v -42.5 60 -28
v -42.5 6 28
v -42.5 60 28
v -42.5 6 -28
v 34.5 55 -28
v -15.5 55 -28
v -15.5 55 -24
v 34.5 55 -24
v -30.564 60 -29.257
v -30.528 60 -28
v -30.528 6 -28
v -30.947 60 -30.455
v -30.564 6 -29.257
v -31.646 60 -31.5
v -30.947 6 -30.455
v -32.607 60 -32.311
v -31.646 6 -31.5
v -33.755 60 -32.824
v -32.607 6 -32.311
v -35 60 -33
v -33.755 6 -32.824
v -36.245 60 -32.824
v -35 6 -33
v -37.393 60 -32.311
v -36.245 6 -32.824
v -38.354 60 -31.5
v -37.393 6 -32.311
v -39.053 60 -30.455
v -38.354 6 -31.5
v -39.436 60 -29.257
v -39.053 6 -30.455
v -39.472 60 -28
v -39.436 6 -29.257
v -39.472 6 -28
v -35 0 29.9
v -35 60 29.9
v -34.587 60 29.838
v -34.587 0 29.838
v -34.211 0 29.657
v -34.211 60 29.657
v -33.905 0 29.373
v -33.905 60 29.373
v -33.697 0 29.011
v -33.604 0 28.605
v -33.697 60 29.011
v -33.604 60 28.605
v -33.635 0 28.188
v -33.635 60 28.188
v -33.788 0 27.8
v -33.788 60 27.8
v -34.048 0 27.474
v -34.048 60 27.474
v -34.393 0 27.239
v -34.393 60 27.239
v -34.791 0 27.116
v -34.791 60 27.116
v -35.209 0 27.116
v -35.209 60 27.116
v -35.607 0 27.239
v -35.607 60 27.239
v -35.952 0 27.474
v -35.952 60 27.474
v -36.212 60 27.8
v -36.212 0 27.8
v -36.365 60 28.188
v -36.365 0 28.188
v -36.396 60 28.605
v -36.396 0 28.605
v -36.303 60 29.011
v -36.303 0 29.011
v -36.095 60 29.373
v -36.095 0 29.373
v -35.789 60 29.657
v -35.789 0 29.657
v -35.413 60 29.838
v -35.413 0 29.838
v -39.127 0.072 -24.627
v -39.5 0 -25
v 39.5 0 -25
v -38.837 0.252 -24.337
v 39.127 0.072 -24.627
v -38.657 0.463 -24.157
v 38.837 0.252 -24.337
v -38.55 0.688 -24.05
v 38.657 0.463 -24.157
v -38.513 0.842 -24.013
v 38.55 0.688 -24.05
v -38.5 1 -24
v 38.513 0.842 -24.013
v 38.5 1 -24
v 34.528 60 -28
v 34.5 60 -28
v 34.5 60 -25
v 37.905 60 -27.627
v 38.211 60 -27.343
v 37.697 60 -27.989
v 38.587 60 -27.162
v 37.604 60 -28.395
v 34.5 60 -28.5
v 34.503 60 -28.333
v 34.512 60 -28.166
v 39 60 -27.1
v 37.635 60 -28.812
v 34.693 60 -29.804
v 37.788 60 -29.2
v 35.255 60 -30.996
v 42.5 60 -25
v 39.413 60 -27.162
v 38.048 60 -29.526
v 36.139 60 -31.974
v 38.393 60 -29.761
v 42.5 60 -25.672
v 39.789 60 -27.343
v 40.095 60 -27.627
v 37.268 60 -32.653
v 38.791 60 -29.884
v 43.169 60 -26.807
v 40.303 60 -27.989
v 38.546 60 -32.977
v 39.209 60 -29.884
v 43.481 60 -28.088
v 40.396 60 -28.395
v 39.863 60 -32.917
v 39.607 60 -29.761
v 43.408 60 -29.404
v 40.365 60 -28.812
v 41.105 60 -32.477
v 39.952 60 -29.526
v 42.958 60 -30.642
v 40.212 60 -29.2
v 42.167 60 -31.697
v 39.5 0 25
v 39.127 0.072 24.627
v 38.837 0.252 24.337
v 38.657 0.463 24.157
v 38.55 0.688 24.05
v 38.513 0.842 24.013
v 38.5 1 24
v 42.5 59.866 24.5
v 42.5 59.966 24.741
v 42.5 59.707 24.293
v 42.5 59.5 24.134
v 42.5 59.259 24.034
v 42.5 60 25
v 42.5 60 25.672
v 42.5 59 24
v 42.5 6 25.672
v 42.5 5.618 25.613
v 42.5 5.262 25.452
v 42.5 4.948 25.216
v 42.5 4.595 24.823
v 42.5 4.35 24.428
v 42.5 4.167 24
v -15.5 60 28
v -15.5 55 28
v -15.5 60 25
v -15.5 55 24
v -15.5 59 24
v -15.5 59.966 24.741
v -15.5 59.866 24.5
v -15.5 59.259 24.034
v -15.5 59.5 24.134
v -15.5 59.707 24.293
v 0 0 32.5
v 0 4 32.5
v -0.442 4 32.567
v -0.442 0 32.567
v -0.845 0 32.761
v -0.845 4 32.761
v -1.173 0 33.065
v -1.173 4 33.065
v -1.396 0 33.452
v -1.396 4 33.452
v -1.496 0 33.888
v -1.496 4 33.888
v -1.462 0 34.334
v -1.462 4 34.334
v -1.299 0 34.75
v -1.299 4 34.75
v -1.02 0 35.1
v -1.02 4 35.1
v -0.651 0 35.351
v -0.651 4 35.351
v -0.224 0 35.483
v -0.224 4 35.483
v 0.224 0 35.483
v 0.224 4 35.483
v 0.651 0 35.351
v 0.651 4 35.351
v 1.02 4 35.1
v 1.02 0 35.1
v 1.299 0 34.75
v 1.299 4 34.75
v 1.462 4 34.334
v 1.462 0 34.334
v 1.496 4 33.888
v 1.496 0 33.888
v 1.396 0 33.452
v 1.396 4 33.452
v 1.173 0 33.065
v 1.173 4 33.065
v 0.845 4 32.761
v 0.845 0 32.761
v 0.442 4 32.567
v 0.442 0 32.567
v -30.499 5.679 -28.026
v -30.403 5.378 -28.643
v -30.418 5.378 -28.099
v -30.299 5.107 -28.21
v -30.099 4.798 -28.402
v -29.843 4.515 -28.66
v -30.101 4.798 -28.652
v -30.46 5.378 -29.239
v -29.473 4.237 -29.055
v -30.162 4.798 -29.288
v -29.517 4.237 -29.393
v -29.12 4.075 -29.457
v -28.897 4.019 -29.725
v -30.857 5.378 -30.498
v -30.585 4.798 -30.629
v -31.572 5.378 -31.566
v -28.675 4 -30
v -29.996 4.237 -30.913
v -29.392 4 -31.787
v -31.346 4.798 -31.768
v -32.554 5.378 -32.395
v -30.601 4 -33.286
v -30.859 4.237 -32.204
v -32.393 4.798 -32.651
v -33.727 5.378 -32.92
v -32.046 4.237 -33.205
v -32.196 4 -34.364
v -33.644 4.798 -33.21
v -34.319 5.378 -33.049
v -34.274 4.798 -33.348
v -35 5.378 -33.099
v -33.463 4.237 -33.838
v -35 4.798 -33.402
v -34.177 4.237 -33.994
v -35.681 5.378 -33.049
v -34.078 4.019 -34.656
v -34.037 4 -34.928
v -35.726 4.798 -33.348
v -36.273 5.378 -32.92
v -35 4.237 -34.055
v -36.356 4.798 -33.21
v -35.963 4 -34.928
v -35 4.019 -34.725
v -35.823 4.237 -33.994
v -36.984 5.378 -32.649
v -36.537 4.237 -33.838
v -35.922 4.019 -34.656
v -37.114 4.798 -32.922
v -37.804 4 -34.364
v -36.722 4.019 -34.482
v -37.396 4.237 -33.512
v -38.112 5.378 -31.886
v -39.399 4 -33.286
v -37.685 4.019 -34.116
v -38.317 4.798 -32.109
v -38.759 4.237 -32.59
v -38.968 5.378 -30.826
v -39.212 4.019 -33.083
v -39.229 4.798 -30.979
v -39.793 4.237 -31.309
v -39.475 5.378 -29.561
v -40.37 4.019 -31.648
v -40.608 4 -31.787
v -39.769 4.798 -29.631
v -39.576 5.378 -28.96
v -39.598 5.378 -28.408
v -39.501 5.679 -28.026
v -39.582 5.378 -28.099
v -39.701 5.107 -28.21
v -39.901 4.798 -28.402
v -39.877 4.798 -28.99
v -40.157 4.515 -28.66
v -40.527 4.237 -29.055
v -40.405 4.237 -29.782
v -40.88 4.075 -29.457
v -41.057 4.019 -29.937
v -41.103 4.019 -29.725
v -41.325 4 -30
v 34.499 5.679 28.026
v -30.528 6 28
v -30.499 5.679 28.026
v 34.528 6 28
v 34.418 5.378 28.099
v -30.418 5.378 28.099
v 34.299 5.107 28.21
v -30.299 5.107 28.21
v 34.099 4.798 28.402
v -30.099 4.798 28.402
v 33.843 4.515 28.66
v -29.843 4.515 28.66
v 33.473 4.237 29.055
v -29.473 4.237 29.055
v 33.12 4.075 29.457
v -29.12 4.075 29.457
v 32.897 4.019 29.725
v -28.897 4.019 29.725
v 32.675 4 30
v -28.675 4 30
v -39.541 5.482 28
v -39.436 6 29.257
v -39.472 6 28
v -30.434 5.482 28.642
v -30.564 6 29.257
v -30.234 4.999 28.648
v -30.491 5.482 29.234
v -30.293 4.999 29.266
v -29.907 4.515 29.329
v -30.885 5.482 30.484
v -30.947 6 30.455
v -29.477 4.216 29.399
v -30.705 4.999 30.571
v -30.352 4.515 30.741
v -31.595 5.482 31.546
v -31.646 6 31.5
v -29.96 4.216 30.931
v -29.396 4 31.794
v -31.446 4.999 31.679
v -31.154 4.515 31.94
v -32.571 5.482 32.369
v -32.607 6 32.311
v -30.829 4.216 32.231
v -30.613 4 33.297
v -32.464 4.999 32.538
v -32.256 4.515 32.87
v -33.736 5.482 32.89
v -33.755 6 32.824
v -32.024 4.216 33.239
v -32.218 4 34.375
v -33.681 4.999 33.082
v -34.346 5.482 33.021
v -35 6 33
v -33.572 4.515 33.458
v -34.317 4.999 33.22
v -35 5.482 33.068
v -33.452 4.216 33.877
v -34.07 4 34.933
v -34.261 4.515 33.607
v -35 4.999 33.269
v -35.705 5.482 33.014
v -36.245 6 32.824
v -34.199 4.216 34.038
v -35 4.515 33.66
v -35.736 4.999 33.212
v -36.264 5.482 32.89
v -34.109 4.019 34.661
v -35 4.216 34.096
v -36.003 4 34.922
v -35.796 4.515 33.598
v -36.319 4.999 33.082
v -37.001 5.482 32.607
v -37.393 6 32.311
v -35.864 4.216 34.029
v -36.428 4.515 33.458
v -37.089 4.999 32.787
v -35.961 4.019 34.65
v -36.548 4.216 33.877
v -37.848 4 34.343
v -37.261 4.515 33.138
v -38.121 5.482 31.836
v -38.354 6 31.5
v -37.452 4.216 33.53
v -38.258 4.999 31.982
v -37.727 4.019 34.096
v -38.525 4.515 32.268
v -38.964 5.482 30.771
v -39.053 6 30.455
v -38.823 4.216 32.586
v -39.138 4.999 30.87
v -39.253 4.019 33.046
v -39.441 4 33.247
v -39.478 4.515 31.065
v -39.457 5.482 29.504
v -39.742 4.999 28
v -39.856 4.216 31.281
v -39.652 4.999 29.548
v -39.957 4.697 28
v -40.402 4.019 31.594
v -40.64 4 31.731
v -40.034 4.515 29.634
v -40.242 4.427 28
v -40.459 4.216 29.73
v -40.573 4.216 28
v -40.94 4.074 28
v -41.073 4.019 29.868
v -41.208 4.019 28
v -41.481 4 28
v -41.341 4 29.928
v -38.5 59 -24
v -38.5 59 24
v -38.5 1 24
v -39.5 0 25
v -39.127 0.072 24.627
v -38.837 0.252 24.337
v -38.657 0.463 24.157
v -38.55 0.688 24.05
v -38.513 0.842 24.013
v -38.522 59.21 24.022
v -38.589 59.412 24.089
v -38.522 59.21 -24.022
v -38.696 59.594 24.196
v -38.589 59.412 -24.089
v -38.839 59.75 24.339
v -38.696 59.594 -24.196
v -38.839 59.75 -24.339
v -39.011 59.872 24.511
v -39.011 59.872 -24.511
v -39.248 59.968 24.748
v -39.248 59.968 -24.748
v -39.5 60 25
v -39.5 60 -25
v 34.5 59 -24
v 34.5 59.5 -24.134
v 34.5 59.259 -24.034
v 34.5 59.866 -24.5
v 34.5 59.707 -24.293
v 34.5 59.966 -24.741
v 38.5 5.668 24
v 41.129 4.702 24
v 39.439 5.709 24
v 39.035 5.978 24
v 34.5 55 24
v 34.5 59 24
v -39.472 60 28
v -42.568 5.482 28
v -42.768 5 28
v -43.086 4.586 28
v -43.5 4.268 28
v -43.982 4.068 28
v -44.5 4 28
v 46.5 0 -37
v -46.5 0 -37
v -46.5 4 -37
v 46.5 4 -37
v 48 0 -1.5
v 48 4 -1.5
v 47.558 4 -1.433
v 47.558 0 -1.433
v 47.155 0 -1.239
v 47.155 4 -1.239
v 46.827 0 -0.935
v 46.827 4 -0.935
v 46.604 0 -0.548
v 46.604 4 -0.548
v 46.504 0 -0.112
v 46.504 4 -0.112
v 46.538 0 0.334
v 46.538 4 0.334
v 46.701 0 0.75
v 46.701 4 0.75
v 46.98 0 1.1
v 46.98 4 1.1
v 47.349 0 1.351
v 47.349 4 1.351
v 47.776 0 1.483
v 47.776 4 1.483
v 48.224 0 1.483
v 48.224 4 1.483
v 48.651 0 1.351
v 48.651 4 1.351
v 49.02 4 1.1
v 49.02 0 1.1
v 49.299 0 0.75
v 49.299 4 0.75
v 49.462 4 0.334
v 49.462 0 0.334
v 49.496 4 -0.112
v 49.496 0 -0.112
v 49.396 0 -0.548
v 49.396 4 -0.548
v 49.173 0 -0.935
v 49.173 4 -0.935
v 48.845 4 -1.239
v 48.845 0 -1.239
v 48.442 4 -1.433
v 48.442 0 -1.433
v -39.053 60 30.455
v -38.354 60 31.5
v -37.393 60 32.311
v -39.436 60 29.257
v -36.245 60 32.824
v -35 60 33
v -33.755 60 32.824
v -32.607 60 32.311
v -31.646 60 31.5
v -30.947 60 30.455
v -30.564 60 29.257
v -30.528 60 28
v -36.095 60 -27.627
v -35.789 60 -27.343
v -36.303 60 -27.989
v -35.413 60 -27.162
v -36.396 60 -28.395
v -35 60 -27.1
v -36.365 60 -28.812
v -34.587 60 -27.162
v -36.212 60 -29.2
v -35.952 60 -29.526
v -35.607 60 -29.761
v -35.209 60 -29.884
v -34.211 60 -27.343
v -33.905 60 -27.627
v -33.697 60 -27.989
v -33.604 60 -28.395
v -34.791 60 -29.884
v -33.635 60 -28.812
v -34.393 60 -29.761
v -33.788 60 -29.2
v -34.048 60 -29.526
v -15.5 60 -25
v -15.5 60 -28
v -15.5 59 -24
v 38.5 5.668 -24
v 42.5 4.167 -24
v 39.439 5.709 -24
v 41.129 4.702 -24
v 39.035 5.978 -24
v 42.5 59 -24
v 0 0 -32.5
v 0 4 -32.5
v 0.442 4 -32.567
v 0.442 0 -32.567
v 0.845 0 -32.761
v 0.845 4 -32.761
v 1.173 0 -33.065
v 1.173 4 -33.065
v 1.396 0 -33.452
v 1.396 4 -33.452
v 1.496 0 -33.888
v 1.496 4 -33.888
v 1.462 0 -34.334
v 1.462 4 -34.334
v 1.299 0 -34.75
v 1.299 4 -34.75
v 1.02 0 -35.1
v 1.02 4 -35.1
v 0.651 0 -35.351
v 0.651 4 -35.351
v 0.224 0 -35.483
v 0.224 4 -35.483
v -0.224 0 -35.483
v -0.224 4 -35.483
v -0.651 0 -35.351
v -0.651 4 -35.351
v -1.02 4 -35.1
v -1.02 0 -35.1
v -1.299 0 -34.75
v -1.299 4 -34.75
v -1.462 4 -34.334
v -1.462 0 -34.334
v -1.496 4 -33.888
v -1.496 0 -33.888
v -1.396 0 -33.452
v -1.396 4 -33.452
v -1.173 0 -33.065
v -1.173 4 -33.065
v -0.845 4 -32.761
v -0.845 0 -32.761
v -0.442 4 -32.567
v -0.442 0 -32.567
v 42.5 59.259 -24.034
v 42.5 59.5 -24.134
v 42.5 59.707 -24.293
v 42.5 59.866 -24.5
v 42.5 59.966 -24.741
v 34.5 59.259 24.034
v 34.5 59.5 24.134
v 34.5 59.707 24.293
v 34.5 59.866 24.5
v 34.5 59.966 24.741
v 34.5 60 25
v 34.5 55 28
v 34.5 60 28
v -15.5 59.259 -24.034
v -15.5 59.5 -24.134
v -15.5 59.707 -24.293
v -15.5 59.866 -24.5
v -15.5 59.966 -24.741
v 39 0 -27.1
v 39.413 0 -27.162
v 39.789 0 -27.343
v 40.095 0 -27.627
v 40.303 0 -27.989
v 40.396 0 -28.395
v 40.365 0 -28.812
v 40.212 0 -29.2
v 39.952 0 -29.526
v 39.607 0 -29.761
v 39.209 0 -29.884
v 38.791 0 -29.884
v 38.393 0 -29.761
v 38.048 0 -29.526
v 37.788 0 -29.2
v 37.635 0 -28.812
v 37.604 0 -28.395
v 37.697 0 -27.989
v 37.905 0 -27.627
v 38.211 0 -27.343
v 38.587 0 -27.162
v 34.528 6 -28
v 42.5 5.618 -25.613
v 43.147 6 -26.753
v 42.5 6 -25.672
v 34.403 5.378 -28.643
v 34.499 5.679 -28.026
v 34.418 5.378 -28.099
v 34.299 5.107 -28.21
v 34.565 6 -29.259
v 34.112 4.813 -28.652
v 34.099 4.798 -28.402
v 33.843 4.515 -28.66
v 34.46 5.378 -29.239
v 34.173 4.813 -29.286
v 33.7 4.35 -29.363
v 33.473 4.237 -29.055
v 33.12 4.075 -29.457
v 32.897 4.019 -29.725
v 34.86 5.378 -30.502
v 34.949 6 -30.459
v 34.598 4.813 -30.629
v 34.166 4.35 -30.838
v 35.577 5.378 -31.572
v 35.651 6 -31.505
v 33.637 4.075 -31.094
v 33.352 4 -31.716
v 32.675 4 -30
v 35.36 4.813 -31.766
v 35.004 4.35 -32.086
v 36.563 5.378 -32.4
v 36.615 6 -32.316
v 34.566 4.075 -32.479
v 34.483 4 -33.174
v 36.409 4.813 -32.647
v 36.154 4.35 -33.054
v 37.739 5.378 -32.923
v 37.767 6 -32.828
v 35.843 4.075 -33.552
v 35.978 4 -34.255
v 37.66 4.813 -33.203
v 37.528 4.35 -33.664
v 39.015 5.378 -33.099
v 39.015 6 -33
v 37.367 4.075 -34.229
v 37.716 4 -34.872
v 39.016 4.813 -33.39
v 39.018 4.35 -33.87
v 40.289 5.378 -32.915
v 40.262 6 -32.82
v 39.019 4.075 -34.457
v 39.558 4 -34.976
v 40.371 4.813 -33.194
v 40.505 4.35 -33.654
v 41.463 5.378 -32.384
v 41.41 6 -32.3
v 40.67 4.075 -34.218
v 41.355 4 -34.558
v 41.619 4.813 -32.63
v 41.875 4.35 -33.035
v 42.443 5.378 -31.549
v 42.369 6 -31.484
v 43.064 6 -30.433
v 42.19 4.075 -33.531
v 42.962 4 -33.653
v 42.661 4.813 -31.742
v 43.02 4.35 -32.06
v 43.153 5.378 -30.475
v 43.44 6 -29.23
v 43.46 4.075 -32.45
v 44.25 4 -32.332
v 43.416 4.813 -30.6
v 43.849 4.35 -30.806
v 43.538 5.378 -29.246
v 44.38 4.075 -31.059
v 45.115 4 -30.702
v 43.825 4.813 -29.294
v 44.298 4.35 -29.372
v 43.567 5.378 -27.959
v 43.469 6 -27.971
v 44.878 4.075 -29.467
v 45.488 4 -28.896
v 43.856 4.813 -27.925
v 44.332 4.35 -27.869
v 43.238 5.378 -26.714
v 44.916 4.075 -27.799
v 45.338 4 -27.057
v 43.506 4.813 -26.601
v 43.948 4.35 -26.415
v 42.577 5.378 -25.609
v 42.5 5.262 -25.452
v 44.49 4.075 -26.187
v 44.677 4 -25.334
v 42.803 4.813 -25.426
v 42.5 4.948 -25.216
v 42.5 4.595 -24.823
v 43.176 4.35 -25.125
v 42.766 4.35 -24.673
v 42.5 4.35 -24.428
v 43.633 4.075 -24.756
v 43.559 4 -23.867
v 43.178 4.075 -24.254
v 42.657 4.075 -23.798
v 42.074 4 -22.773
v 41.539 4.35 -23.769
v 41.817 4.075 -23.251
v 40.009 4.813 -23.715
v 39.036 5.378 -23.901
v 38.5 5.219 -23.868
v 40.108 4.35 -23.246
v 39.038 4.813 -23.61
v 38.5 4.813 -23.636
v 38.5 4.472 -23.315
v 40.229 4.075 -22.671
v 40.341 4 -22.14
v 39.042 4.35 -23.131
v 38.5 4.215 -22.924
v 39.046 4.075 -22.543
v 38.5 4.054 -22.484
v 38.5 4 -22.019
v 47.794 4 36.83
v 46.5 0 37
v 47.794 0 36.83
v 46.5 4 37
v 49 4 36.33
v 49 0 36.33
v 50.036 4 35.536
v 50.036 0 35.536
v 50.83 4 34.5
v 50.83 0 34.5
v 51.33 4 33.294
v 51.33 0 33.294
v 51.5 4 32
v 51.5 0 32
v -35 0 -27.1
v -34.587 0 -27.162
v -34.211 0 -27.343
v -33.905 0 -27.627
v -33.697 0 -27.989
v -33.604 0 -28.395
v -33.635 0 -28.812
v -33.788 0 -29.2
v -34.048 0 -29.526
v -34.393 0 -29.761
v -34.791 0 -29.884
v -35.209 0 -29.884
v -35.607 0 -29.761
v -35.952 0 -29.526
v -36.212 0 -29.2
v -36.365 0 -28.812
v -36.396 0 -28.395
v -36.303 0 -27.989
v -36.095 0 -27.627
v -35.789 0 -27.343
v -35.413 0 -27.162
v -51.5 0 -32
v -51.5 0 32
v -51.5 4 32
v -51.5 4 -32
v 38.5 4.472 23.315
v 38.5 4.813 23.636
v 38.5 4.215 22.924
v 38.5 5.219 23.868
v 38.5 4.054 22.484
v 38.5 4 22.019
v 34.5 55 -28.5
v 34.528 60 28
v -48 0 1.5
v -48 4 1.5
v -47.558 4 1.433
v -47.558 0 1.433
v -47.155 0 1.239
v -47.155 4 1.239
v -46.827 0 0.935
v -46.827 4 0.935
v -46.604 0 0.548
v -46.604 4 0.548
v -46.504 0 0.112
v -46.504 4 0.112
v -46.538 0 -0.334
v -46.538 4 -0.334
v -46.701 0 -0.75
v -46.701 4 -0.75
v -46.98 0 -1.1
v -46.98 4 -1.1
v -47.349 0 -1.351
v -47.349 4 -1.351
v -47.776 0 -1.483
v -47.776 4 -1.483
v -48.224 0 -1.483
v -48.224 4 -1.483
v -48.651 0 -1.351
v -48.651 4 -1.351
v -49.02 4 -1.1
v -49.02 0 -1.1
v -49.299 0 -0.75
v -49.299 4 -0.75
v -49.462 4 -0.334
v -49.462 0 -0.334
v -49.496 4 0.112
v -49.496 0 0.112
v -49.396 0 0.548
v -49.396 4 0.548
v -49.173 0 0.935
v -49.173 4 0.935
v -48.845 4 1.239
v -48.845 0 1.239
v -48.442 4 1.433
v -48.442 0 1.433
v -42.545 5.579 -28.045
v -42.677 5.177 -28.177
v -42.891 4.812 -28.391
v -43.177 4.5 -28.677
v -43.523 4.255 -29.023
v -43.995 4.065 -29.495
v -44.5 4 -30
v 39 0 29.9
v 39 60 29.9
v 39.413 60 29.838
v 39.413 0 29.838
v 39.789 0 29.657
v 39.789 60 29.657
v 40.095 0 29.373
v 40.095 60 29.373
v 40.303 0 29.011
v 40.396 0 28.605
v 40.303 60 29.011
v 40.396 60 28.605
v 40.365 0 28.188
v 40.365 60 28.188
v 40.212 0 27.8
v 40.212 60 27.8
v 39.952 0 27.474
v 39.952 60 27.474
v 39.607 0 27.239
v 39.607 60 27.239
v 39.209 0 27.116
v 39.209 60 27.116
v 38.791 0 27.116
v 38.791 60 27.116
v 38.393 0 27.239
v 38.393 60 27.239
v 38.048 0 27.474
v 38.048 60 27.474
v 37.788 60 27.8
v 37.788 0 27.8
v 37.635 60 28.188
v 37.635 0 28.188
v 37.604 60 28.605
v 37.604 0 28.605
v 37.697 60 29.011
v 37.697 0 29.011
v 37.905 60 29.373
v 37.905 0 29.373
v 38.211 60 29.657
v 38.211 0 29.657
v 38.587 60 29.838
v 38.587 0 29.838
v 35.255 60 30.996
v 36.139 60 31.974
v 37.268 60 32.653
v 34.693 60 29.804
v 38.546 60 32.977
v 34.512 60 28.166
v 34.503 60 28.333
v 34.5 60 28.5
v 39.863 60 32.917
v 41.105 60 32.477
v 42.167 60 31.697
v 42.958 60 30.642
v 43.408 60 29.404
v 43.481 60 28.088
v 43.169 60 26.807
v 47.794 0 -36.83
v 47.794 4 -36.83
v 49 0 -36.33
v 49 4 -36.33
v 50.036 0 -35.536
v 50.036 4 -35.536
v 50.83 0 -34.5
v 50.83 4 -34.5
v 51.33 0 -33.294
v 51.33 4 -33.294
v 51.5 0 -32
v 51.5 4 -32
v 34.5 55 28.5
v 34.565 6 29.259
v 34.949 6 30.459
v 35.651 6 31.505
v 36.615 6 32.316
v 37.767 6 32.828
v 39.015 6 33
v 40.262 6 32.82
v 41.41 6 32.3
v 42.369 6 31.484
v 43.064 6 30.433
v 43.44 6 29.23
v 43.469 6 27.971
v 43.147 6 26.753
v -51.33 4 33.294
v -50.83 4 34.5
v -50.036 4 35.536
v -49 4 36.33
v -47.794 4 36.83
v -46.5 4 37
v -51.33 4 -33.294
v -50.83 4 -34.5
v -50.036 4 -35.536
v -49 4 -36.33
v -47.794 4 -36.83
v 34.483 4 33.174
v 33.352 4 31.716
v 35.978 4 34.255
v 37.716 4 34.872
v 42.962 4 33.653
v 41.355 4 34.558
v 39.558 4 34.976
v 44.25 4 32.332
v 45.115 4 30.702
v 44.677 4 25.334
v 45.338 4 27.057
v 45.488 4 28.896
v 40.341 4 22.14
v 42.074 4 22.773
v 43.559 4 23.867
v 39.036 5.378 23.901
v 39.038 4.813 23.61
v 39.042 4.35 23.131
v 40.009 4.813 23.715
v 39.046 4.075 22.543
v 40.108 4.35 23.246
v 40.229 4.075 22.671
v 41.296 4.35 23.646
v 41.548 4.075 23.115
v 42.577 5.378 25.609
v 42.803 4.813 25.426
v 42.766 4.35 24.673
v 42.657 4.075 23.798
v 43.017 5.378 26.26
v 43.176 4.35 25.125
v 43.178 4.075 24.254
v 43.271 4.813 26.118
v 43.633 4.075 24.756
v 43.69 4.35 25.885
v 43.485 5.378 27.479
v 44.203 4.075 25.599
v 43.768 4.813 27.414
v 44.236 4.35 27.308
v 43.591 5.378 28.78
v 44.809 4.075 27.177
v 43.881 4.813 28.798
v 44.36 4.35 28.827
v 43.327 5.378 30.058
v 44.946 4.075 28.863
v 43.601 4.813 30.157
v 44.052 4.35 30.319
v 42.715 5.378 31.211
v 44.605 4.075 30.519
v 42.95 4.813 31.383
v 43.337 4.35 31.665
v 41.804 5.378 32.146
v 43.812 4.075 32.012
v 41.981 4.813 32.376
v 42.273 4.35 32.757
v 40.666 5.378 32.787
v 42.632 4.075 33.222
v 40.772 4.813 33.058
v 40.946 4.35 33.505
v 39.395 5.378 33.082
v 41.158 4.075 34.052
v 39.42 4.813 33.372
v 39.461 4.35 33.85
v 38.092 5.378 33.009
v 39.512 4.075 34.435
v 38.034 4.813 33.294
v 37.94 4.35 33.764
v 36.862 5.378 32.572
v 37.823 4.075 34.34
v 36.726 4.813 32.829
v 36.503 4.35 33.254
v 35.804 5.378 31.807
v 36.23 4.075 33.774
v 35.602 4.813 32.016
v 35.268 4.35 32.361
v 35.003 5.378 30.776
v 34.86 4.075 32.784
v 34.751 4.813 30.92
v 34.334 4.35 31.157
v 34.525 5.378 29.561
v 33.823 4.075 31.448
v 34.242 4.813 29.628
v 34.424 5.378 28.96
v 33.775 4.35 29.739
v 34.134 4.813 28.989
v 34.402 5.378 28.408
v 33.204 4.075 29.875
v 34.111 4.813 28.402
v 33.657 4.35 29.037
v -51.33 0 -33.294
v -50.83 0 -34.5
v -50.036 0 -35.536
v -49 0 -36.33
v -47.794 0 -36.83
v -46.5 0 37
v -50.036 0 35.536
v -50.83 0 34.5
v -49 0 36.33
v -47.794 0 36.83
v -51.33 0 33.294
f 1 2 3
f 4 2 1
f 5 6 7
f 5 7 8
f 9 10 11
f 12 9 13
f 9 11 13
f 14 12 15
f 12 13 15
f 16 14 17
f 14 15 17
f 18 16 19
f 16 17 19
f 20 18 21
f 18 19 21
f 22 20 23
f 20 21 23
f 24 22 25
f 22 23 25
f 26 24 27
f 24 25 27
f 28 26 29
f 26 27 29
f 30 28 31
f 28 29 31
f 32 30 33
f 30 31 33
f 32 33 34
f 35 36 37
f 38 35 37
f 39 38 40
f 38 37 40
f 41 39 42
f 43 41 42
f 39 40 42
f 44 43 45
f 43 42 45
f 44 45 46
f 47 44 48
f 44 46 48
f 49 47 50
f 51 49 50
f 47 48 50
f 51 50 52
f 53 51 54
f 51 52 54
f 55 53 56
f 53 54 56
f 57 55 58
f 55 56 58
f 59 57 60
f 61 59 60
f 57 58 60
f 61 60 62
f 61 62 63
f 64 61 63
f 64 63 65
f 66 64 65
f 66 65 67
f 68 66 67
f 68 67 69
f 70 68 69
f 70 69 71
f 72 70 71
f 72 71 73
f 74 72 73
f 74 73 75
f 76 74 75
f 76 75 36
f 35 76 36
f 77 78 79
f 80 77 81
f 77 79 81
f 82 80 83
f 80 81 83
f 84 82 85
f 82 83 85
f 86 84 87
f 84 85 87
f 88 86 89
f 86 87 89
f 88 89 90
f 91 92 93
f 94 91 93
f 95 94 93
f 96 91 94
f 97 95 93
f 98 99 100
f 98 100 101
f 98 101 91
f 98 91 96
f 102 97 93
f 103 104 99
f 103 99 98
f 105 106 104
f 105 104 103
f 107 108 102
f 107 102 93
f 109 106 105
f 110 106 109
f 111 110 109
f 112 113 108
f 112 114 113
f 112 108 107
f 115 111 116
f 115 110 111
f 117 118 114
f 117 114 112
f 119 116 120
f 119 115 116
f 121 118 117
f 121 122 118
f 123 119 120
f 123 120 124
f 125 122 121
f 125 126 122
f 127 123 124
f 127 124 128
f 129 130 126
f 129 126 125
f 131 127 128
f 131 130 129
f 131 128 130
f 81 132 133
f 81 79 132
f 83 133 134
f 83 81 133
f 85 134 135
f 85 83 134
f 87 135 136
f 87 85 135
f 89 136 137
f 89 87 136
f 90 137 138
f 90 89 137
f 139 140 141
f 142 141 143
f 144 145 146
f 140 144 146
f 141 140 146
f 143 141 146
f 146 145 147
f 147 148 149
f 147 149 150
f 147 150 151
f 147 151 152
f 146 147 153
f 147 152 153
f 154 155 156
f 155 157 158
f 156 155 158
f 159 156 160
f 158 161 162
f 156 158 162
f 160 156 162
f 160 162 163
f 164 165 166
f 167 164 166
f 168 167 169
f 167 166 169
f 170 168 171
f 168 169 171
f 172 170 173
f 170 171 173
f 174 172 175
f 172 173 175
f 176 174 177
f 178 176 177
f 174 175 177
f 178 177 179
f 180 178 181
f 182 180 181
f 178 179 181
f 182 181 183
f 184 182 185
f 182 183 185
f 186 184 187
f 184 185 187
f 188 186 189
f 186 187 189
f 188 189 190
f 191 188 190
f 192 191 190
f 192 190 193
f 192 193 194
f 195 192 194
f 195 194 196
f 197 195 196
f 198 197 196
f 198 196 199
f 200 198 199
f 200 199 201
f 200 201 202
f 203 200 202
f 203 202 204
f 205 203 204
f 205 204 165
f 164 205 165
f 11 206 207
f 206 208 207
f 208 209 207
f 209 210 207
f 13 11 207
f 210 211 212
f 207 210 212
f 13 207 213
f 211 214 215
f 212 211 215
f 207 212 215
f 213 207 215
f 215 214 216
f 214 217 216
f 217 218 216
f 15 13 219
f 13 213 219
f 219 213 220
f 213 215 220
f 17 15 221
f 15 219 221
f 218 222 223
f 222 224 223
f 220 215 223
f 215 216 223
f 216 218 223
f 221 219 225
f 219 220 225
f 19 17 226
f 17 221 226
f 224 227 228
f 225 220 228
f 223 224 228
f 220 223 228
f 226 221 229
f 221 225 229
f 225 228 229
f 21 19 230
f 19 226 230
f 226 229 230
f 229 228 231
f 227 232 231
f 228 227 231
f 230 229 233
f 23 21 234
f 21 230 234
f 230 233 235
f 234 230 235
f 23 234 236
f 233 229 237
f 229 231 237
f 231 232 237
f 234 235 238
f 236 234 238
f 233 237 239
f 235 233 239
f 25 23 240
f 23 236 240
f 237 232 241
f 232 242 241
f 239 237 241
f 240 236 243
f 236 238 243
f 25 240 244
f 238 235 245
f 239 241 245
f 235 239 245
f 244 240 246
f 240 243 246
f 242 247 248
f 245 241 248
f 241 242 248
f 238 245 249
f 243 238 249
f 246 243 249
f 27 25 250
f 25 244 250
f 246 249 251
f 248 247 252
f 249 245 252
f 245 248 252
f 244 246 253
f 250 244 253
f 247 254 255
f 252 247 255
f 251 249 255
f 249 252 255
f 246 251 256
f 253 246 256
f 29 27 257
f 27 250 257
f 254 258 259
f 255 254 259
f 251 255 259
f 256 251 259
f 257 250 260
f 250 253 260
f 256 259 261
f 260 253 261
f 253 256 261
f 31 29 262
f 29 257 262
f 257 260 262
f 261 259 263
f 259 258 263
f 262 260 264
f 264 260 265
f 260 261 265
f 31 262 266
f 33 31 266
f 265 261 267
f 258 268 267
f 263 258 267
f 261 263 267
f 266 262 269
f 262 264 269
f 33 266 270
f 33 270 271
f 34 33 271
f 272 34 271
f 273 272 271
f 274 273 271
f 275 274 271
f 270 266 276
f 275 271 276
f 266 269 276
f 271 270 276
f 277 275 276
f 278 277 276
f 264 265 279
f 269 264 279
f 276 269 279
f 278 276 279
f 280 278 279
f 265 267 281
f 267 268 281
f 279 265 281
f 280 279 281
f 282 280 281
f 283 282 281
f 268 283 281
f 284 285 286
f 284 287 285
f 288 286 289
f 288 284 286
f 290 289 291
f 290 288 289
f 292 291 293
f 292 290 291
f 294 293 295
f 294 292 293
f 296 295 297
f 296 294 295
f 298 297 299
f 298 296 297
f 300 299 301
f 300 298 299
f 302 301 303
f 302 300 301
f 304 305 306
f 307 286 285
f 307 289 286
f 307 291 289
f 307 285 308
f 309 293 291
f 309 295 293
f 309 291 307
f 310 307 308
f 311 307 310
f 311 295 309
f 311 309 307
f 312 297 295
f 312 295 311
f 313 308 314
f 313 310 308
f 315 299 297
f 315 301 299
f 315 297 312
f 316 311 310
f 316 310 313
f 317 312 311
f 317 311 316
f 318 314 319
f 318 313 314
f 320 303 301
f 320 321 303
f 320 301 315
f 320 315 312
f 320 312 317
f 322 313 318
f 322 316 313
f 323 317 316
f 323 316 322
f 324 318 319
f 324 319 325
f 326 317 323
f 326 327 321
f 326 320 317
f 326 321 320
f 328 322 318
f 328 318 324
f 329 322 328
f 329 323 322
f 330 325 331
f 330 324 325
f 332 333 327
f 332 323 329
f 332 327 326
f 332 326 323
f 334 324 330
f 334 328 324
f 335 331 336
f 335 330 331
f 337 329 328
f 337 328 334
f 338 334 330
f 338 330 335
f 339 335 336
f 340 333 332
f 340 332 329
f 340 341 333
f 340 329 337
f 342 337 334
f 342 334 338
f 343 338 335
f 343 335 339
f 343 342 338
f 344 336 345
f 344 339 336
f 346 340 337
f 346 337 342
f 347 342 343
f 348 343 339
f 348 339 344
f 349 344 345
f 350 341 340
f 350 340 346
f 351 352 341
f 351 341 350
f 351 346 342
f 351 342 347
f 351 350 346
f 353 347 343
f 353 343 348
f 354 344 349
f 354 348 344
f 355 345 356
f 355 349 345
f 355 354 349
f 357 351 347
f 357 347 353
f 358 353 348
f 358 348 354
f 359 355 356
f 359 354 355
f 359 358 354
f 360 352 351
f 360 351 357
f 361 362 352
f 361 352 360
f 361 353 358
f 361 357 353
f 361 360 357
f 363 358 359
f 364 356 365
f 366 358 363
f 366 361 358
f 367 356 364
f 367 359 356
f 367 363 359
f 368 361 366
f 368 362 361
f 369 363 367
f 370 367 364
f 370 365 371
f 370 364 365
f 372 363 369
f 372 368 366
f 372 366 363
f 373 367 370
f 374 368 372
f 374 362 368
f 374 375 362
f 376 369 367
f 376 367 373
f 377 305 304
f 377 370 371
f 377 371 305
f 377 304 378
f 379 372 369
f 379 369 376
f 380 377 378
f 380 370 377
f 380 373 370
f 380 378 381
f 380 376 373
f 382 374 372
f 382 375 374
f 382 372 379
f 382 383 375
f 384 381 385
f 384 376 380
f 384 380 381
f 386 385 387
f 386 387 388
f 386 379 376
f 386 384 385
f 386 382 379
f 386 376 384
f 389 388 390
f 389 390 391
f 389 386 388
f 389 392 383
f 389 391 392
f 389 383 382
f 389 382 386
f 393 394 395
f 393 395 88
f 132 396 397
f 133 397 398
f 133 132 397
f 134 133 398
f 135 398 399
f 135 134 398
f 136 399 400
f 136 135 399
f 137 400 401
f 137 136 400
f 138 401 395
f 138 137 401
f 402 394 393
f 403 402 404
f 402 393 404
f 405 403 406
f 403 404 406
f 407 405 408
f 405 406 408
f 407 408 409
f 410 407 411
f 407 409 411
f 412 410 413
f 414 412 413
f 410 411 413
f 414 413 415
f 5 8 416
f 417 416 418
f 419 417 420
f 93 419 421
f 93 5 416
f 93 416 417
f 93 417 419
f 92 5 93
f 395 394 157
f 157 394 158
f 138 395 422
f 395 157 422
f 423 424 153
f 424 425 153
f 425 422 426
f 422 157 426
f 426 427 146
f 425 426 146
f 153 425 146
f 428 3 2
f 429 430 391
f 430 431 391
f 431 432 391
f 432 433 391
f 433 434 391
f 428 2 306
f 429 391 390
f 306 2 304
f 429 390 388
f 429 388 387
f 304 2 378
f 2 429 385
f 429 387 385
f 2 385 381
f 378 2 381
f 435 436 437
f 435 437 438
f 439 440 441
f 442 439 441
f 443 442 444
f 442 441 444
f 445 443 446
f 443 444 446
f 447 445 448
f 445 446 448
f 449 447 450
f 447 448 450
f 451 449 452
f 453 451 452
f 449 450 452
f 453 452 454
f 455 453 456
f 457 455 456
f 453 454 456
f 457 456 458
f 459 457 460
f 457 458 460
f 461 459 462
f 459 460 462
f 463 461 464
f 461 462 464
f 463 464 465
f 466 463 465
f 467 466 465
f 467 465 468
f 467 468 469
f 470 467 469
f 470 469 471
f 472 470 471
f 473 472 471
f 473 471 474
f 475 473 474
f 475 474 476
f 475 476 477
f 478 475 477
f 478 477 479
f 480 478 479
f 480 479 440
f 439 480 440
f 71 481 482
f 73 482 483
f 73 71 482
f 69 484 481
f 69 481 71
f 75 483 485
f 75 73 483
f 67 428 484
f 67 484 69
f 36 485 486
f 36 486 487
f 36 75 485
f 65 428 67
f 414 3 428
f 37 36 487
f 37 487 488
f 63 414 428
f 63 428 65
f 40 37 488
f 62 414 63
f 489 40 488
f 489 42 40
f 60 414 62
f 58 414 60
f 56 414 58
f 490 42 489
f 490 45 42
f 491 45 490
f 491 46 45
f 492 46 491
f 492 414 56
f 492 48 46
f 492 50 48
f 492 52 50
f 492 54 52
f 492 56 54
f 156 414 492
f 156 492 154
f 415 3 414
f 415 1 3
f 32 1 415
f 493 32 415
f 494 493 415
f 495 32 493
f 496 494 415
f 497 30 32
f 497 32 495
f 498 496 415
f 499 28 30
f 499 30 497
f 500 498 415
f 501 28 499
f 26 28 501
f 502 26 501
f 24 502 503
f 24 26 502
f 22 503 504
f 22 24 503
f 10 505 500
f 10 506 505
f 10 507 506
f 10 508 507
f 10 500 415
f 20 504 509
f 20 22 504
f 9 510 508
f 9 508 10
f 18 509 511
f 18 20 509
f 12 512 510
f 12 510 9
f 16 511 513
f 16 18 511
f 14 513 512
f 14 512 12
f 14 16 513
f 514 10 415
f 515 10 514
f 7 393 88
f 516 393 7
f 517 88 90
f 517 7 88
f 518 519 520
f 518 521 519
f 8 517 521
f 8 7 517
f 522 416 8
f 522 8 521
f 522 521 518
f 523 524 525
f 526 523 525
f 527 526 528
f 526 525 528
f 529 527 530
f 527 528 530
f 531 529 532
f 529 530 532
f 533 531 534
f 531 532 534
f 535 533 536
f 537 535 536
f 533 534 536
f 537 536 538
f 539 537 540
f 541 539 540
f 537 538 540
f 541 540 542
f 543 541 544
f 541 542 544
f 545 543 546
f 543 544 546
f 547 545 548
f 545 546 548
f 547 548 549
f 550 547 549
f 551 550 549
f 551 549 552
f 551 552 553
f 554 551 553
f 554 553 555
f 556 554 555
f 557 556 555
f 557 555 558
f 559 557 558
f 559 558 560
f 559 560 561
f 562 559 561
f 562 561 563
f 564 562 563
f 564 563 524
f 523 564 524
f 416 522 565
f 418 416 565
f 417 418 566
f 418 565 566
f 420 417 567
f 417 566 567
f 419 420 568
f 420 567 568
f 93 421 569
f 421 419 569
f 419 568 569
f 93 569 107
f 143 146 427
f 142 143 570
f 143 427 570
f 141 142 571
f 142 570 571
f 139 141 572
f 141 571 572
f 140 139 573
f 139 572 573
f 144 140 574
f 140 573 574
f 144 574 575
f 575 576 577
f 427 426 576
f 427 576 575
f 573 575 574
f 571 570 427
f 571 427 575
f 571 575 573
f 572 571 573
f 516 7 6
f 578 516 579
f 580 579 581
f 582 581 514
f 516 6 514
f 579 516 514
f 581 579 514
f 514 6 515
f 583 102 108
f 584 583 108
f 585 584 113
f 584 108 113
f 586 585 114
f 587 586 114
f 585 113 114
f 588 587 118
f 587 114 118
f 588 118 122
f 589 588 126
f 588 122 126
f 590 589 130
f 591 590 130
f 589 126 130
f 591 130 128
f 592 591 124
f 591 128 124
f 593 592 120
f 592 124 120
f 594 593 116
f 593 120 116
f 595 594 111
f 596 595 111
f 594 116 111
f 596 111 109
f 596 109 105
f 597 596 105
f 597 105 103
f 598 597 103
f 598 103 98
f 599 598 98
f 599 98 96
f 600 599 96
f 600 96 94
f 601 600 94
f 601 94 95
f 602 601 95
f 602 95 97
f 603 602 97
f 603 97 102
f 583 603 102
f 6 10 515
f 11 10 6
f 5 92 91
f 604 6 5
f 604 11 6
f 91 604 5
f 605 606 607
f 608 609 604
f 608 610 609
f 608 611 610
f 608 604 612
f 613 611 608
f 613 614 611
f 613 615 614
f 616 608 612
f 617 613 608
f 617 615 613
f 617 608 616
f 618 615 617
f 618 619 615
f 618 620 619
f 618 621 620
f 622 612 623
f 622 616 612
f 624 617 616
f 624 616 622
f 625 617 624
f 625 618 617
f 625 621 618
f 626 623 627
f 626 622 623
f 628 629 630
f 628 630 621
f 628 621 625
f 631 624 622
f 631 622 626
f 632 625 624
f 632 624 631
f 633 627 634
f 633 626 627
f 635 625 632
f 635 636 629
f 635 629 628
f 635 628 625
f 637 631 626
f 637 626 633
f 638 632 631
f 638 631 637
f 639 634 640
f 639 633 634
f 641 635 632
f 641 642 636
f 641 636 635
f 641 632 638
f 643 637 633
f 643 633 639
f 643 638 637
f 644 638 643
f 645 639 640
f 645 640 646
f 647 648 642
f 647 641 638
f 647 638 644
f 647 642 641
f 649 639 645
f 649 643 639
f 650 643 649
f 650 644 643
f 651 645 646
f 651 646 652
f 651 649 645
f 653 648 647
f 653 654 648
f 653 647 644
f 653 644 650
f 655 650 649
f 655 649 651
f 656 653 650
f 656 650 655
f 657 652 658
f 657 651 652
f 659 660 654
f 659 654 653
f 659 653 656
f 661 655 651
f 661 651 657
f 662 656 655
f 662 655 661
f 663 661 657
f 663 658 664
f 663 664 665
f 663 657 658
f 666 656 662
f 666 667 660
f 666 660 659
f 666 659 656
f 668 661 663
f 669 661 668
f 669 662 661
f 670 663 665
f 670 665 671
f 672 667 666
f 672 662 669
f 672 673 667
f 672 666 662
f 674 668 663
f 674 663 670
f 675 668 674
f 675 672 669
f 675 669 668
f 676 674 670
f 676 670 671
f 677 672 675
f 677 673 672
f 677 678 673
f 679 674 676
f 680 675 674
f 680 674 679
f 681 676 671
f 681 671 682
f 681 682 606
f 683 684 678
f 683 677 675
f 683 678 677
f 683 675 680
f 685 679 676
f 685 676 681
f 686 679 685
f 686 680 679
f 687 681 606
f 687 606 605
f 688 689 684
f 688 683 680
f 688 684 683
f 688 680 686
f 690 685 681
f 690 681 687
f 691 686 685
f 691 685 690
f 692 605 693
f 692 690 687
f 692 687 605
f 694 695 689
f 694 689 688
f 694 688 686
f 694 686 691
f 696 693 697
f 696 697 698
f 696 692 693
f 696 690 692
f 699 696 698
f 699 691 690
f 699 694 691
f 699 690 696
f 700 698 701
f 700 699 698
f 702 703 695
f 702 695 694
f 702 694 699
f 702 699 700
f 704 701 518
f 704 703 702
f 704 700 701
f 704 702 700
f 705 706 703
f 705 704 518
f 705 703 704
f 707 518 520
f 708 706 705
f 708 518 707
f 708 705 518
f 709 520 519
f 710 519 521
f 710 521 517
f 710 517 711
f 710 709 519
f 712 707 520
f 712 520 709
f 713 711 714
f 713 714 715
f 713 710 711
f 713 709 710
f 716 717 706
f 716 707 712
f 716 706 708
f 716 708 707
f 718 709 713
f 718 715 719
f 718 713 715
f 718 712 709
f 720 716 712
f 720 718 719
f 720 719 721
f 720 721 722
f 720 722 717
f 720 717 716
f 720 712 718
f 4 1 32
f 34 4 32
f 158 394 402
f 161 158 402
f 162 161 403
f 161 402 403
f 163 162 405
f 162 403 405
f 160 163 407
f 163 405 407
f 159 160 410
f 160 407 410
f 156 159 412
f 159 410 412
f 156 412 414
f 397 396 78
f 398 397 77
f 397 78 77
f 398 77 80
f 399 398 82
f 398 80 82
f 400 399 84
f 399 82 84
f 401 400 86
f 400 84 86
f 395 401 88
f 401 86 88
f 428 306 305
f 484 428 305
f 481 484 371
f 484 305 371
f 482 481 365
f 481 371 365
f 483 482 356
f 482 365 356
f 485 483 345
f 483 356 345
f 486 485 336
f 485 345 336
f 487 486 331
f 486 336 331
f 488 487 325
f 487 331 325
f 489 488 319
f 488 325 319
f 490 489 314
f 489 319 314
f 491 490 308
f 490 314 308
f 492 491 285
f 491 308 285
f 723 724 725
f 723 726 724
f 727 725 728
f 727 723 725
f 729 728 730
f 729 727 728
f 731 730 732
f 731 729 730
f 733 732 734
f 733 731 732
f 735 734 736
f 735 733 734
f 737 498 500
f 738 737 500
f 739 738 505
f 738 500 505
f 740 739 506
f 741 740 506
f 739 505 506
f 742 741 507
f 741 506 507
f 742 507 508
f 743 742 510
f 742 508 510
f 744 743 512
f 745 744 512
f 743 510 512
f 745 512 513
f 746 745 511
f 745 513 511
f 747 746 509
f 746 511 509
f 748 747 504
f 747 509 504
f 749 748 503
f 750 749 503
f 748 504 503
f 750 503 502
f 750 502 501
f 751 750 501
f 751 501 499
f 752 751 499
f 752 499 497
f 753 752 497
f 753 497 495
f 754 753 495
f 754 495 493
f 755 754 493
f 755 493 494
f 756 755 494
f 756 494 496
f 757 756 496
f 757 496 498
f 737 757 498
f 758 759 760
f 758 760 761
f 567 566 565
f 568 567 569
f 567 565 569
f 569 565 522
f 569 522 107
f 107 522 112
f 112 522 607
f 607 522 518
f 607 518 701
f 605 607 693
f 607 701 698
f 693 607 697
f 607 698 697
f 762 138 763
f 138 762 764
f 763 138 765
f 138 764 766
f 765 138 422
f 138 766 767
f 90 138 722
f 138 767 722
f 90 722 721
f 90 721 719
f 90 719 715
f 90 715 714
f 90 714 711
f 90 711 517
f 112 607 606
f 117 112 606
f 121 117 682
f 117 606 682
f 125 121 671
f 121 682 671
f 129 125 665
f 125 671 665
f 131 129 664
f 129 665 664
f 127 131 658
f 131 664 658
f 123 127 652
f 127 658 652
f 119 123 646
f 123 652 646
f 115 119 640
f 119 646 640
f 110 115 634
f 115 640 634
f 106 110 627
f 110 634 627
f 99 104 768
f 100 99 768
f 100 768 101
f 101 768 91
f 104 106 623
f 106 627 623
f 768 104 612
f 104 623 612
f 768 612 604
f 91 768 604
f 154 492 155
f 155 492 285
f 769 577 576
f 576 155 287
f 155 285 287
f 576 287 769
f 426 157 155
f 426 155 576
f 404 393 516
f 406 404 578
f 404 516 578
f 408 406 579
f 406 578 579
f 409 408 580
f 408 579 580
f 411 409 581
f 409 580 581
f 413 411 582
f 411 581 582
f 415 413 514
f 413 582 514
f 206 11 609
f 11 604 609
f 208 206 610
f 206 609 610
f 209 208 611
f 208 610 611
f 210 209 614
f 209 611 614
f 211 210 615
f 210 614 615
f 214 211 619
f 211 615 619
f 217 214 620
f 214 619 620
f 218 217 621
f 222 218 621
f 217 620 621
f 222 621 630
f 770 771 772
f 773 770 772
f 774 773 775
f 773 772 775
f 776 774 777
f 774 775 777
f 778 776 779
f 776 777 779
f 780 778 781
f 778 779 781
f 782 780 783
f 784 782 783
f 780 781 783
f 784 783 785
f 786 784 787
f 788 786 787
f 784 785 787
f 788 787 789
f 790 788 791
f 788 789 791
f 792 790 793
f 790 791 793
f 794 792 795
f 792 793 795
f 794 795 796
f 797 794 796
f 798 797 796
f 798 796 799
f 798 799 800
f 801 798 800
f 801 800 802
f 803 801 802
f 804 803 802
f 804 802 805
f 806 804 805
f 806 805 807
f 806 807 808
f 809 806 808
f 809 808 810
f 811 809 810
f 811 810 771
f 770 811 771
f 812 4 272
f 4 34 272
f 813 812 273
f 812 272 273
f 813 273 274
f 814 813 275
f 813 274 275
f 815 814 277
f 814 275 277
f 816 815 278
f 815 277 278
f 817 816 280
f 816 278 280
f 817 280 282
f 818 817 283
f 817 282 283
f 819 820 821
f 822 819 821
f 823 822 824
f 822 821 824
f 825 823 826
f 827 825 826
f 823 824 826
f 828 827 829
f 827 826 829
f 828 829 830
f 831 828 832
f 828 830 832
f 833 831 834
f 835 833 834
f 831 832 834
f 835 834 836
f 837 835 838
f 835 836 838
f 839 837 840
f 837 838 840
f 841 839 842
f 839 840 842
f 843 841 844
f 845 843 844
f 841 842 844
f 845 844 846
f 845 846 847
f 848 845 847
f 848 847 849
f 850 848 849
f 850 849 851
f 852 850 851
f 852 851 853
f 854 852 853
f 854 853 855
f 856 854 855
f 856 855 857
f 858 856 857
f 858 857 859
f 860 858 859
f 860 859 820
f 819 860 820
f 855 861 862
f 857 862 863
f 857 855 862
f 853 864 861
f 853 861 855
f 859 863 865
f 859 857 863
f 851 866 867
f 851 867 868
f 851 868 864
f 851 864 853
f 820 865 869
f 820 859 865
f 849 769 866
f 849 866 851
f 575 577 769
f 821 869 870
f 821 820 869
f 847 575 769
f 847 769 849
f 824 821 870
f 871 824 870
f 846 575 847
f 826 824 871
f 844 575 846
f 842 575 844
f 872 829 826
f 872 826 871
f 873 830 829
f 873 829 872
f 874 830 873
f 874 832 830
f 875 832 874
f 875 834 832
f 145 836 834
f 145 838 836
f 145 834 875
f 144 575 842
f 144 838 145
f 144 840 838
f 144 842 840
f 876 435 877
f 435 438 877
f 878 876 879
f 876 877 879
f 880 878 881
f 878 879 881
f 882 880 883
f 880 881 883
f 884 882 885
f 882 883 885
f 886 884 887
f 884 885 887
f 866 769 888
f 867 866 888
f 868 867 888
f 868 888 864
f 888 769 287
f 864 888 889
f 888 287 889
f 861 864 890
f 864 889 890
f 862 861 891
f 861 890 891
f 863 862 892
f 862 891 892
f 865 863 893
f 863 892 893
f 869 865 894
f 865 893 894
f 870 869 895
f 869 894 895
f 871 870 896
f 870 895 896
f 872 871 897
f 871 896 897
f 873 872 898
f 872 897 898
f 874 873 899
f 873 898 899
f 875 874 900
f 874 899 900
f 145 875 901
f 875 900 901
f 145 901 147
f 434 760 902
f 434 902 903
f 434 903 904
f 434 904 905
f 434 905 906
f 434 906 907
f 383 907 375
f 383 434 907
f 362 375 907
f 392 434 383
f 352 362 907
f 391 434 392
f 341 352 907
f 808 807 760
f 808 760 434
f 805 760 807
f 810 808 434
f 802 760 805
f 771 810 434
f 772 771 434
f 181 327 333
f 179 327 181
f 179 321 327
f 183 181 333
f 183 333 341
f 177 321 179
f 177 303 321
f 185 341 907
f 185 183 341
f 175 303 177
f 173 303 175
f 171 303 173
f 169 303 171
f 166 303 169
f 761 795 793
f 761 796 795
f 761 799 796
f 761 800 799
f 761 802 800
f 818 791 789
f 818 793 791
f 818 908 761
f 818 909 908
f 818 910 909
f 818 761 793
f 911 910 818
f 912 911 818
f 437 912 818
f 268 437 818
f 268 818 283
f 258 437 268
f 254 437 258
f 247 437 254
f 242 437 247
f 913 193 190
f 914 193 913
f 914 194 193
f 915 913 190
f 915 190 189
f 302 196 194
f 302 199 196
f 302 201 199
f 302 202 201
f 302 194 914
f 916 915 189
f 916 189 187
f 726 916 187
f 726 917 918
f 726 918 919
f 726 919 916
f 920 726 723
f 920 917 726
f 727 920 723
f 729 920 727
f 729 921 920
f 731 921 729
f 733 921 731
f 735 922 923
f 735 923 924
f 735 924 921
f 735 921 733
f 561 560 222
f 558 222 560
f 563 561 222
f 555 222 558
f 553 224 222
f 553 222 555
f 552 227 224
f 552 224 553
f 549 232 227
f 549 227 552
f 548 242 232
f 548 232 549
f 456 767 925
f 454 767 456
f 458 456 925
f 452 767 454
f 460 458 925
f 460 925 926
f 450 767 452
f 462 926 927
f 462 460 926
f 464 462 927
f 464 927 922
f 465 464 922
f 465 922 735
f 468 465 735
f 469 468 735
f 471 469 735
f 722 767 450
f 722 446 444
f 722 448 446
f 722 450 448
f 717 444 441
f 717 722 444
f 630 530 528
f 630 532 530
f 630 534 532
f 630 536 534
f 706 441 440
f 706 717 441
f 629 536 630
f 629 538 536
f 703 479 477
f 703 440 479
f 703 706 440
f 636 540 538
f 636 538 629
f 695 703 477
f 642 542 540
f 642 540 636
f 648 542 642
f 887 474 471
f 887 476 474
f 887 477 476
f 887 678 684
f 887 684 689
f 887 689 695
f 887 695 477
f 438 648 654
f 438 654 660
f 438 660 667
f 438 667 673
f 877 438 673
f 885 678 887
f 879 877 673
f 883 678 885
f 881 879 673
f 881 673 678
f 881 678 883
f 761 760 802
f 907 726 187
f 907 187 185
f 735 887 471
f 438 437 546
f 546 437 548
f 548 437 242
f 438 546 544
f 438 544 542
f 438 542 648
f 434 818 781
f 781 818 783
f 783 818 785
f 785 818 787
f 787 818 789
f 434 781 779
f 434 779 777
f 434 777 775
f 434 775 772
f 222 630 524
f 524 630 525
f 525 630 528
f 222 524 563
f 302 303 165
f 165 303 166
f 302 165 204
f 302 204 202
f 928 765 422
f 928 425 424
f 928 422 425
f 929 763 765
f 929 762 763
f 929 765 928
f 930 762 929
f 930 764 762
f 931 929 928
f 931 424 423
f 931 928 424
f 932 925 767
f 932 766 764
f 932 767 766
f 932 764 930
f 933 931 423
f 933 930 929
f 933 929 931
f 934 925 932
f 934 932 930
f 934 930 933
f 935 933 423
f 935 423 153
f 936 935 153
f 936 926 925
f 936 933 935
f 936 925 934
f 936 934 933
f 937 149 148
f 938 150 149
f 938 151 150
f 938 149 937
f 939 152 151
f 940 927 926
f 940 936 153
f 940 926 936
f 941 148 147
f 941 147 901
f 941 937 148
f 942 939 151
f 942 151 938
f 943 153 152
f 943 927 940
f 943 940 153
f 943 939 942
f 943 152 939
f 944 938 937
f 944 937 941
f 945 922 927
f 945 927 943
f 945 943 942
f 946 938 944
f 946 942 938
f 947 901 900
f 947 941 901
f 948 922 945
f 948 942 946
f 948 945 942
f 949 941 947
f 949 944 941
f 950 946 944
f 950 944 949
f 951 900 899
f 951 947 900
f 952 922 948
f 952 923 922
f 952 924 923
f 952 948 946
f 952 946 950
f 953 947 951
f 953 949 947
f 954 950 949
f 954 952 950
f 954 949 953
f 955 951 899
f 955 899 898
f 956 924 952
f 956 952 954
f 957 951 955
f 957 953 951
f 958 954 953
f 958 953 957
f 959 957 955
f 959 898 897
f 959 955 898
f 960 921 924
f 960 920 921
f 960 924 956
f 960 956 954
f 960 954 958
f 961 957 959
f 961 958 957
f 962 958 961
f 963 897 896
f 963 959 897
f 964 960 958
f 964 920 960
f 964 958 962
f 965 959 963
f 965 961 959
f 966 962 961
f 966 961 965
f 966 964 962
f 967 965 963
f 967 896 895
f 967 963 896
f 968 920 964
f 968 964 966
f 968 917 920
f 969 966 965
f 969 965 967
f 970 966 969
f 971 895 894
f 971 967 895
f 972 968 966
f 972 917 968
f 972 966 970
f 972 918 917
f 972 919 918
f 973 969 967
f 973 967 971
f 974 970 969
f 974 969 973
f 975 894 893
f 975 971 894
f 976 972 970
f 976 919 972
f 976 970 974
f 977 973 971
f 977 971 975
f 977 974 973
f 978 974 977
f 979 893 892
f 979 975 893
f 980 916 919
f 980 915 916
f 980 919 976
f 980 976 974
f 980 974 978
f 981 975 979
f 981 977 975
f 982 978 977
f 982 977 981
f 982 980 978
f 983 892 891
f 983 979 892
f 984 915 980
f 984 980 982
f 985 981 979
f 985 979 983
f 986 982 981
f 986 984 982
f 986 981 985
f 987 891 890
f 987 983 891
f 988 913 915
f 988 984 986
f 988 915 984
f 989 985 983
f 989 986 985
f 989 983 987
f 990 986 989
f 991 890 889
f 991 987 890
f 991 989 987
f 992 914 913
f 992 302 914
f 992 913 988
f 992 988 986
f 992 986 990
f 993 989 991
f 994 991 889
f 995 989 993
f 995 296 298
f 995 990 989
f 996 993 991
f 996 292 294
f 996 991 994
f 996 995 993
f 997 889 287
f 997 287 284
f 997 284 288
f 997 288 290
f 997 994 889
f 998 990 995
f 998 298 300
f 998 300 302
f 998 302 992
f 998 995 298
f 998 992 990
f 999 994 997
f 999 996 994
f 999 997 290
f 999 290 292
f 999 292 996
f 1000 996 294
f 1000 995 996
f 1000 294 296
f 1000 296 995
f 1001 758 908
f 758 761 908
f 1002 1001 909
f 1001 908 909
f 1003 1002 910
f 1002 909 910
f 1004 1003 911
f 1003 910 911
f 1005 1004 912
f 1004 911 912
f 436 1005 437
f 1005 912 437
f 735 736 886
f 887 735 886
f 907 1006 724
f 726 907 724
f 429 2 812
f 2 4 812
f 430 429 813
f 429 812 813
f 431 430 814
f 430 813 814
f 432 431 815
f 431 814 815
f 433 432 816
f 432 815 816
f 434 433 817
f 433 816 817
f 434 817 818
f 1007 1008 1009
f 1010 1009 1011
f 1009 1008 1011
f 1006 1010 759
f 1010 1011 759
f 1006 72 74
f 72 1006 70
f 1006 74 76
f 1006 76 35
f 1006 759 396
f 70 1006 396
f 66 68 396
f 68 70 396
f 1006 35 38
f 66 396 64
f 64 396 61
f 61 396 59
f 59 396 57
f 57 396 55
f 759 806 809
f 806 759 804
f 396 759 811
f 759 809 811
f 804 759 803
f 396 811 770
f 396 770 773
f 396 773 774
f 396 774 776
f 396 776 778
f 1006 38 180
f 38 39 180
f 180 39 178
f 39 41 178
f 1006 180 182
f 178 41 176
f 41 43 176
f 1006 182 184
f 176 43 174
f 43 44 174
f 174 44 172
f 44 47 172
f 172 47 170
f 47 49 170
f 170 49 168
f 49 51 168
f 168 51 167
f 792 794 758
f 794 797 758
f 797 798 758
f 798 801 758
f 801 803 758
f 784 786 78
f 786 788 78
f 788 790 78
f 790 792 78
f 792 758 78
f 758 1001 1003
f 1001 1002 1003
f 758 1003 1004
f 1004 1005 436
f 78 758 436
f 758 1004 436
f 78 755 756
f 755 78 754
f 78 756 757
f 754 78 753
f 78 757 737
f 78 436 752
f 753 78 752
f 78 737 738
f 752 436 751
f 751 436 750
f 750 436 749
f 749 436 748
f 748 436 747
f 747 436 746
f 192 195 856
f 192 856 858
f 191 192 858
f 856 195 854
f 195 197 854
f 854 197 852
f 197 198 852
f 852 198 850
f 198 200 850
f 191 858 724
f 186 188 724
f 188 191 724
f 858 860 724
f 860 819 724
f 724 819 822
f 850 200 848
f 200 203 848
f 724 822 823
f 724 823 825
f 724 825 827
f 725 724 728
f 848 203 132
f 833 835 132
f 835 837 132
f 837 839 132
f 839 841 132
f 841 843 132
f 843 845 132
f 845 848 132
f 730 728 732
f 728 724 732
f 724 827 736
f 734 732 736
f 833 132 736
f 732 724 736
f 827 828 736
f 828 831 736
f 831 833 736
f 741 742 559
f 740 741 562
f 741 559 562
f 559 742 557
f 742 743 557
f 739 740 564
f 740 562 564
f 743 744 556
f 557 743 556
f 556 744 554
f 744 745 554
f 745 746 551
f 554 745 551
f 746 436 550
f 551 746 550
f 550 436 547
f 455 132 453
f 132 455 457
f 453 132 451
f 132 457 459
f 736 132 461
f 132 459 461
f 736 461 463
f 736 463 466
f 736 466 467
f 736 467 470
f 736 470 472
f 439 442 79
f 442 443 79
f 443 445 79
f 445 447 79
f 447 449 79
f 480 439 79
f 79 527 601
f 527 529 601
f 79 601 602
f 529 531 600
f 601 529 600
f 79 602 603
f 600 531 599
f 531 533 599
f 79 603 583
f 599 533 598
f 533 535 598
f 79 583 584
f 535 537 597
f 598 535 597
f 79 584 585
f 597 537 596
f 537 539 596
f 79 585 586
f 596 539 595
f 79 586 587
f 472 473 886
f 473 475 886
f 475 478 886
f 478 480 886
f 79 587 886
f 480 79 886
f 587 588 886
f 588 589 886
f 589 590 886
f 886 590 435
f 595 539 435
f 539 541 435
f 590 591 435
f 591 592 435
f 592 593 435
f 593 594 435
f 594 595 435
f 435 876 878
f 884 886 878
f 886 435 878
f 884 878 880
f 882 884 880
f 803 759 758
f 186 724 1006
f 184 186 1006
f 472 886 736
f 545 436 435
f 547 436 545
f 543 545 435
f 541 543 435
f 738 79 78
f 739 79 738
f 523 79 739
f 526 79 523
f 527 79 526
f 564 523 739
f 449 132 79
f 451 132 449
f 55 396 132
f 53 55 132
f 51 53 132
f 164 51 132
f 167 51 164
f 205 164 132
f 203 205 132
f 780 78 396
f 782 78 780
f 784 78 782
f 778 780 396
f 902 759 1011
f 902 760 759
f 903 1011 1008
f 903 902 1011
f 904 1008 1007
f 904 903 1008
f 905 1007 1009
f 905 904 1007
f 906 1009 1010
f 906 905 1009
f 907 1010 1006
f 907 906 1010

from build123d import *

# Parameters (mm, degrees)
SKETCH_1_W               = 103
SKETCH_1_H               = 74
EXTRUDE_1_DEPTH          = 4
SKETCH_2_W               = 85
SKETCH_2_H               = 56
EXTRUDE_2_DEPTH          = 56
SKETCH_3_W               = 81
SKETCH_3_H               = 48
CUT_EXTRUDE_1_DEPTH      = 56
SKETCH_7_R               = 4.5
EXTRUDE_3_DEPTH          = 56
SKETCH_8_R               = 1.4
CUT_EXTRUDE_4_DEPTH      = 88.299770905
SKETCH_4_R               = 1.5
CUT_EXTRUDE_2_DEPTH      = 85.600531913
SKETCH_5_W               = 77
SKETCH_5_H               = 48
CUT_EXTRUDE_3_DEPTH      = 26
FILLET_8_R               = 2
FILLET_7_R               = 1
CUT_EXTRUDE_5_DEPTH      = 88.299770973
CUT_EXTRUDE_5_DEPTH_BACK = 88.299770973
SKETCH_9_W               = 50
SKETCH_9_H               = 5
FILLET_9_R               = 5


with BuildPart() as part:
    # 草图1 → 凸台-拉伸1 (new body)
    with BuildSketch(Plane(origin=(0, 0, 0), x_dir=(1, 0, 0), z_dir=(0, 1, 0))):
        Rectangle(SKETCH_1_W, SKETCH_1_H)
    extrude(amount=EXTRUDE_1_DEPTH)

    # 草图2 → 凸台-拉伸2 (add)
    with BuildSketch(Plane(origin=(0, 4, 0), x_dir=(1, 0, 0), z_dir=(0, 1, 0))):
        Rectangle(SKETCH_2_W, SKETCH_2_H)
    extrude(amount=EXTRUDE_2_DEPTH)

    # 草图3 → 切除-拉伸1 (cut)
    with BuildSketch(Plane(origin=(0, 60, 0), x_dir=(1, 0, 0), z_dir=(0, 1, 0))):
        with Locations((2, 0)):
            Rectangle(SKETCH_3_W, SKETCH_3_H)
    extrude(amount=-CUT_EXTRUDE_1_DEPTH, mode=Mode.SUBTRACT)

    # 草图7 → 凸台-拉伸3 (add)
    with BuildSketch(Plane(origin=(0, 4, 0), x_dir=(1, 0, 0), z_dir=(0, 1, 0))):
        with Locations((-35, 28.5)):
            Circle(SKETCH_7_R)
        with Locations((39, 28.5)):
            Circle(SKETCH_7_R)
        with Locations((39, -28.5)):
            Circle(SKETCH_7_R)
        with Locations((-35, -28.5)):
            Circle(SKETCH_7_R)
    extrude(amount=EXTRUDE_3_DEPTH)

    # 草图8 → 切除-拉伸4 (cut, through all)
    with BuildSketch(Plane(origin=(0, 60, 0), x_dir=(1, 0, 0), z_dir=(0, 1, 0))):
        with Locations(Location((-35, 28.5, 0), (0, 0, 270))):
            Circle(SKETCH_8_R)
        with Locations(Location((39, 28.5, 0), (0, 0, 270))):
            Circle(SKETCH_8_R)
        with Locations(Location((-35, -28.5, 0), (0, 0, 270))):
            Circle(SKETCH_8_R)
        with Locations(Location((39, -28.5, 0), (0, 0, 270))):
            Circle(SKETCH_8_R)
    extrude(amount=-CUT_EXTRUDE_4_DEPTH, mode=Mode.SUBTRACT)

    # 草图4 → 切除-拉伸2 (cut, through all)
    with BuildSketch(Plane(origin=(0, 4, 0), x_dir=(1, 0, 0), z_dir=(0, 1, 0))):
        with Locations(Location((-48, 0, 0), (0, 0, 270))):
            Circle(SKETCH_4_R)
        with Locations(Location((48, 0, 0), (0, 0, 90))):
            Circle(SKETCH_4_R)
        with Locations(Location((0, 34, 0), (0, 0, 270))):
            Circle(SKETCH_4_R)
        with Locations(Location((0, -34, 0), (0, 0, 90))):
            Circle(SKETCH_4_R)
    extrude(amount=-CUT_EXTRUDE_2_DEPTH, mode=Mode.SUBTRACT)

    # 草图5 → 切除-拉伸3 (cut)
    with BuildSketch(Plane(origin=(0, 4, 0), x_dir=(1, 0, 0), z_dir=(0, 1, 0))):
        Rectangle(SKETCH_5_W, SKETCH_5_H)
    extrude(amount=-CUT_EXTRUDE_3_DEPTH, mode=Mode.SUBTRACT)

    # 圆角8
    fillet_8_edges = [part.edges().sort_by_distance(p)[0] for p in [
        (40.261608219, 4, -32.819530611),
        (2, 4, -28),
        (-35, 4, -33),
        (-40.986067977, 4, -28),
        (-42.5, 4, 0),
        (-35, 4, 33),
        (40.261608219, 4, 32.819530611),
        (2, 4, 28),
    ]]
    fillet(fillet_8_edges, radius=FILLET_8_R)

    # 圆角7
    fillet_7_edges = [part.edges().sort_by_distance(p)[0] for p in [
        (0, 0, -24),
        (-38.5, 0, 0),
        (38.5, 0, 0),
        (0, 0, 24),
        (2, 60, -24),
        (-38.5, 60, 0),
        (2, 60, 24),
    ]]
    fillet(fillet_7_edges, radius=FILLET_7_R)

    # 草图9 → 切除-拉伸5 (cut, two sides: drawn at the far end of the back side and taken through both)
    with BuildSketch(Plane.XY.offset(-CUT_EXTRUDE_5_DEPTH_BACK)):
        with Locations((9.5, 57.5)):
            Rectangle(SKETCH_9_W, SKETCH_9_H)
    extrude(amount=CUT_EXTRUDE_5_DEPTH + CUT_EXTRUDE_5_DEPTH_BACK, mode=Mode.SUBTRACT)

    # 圆角9
    fillet_9_edges = [part.edges().sort_by_distance(p)[0] for p in [
        (51.5, 2, 37),
        (-51.5, 2, 37),
        (-51.5, 2, -37),
        (51.5, 2, -37),
    ]]
    fillet(fillet_9_edges, radius=FILLET_9_R)


solid = part.part
